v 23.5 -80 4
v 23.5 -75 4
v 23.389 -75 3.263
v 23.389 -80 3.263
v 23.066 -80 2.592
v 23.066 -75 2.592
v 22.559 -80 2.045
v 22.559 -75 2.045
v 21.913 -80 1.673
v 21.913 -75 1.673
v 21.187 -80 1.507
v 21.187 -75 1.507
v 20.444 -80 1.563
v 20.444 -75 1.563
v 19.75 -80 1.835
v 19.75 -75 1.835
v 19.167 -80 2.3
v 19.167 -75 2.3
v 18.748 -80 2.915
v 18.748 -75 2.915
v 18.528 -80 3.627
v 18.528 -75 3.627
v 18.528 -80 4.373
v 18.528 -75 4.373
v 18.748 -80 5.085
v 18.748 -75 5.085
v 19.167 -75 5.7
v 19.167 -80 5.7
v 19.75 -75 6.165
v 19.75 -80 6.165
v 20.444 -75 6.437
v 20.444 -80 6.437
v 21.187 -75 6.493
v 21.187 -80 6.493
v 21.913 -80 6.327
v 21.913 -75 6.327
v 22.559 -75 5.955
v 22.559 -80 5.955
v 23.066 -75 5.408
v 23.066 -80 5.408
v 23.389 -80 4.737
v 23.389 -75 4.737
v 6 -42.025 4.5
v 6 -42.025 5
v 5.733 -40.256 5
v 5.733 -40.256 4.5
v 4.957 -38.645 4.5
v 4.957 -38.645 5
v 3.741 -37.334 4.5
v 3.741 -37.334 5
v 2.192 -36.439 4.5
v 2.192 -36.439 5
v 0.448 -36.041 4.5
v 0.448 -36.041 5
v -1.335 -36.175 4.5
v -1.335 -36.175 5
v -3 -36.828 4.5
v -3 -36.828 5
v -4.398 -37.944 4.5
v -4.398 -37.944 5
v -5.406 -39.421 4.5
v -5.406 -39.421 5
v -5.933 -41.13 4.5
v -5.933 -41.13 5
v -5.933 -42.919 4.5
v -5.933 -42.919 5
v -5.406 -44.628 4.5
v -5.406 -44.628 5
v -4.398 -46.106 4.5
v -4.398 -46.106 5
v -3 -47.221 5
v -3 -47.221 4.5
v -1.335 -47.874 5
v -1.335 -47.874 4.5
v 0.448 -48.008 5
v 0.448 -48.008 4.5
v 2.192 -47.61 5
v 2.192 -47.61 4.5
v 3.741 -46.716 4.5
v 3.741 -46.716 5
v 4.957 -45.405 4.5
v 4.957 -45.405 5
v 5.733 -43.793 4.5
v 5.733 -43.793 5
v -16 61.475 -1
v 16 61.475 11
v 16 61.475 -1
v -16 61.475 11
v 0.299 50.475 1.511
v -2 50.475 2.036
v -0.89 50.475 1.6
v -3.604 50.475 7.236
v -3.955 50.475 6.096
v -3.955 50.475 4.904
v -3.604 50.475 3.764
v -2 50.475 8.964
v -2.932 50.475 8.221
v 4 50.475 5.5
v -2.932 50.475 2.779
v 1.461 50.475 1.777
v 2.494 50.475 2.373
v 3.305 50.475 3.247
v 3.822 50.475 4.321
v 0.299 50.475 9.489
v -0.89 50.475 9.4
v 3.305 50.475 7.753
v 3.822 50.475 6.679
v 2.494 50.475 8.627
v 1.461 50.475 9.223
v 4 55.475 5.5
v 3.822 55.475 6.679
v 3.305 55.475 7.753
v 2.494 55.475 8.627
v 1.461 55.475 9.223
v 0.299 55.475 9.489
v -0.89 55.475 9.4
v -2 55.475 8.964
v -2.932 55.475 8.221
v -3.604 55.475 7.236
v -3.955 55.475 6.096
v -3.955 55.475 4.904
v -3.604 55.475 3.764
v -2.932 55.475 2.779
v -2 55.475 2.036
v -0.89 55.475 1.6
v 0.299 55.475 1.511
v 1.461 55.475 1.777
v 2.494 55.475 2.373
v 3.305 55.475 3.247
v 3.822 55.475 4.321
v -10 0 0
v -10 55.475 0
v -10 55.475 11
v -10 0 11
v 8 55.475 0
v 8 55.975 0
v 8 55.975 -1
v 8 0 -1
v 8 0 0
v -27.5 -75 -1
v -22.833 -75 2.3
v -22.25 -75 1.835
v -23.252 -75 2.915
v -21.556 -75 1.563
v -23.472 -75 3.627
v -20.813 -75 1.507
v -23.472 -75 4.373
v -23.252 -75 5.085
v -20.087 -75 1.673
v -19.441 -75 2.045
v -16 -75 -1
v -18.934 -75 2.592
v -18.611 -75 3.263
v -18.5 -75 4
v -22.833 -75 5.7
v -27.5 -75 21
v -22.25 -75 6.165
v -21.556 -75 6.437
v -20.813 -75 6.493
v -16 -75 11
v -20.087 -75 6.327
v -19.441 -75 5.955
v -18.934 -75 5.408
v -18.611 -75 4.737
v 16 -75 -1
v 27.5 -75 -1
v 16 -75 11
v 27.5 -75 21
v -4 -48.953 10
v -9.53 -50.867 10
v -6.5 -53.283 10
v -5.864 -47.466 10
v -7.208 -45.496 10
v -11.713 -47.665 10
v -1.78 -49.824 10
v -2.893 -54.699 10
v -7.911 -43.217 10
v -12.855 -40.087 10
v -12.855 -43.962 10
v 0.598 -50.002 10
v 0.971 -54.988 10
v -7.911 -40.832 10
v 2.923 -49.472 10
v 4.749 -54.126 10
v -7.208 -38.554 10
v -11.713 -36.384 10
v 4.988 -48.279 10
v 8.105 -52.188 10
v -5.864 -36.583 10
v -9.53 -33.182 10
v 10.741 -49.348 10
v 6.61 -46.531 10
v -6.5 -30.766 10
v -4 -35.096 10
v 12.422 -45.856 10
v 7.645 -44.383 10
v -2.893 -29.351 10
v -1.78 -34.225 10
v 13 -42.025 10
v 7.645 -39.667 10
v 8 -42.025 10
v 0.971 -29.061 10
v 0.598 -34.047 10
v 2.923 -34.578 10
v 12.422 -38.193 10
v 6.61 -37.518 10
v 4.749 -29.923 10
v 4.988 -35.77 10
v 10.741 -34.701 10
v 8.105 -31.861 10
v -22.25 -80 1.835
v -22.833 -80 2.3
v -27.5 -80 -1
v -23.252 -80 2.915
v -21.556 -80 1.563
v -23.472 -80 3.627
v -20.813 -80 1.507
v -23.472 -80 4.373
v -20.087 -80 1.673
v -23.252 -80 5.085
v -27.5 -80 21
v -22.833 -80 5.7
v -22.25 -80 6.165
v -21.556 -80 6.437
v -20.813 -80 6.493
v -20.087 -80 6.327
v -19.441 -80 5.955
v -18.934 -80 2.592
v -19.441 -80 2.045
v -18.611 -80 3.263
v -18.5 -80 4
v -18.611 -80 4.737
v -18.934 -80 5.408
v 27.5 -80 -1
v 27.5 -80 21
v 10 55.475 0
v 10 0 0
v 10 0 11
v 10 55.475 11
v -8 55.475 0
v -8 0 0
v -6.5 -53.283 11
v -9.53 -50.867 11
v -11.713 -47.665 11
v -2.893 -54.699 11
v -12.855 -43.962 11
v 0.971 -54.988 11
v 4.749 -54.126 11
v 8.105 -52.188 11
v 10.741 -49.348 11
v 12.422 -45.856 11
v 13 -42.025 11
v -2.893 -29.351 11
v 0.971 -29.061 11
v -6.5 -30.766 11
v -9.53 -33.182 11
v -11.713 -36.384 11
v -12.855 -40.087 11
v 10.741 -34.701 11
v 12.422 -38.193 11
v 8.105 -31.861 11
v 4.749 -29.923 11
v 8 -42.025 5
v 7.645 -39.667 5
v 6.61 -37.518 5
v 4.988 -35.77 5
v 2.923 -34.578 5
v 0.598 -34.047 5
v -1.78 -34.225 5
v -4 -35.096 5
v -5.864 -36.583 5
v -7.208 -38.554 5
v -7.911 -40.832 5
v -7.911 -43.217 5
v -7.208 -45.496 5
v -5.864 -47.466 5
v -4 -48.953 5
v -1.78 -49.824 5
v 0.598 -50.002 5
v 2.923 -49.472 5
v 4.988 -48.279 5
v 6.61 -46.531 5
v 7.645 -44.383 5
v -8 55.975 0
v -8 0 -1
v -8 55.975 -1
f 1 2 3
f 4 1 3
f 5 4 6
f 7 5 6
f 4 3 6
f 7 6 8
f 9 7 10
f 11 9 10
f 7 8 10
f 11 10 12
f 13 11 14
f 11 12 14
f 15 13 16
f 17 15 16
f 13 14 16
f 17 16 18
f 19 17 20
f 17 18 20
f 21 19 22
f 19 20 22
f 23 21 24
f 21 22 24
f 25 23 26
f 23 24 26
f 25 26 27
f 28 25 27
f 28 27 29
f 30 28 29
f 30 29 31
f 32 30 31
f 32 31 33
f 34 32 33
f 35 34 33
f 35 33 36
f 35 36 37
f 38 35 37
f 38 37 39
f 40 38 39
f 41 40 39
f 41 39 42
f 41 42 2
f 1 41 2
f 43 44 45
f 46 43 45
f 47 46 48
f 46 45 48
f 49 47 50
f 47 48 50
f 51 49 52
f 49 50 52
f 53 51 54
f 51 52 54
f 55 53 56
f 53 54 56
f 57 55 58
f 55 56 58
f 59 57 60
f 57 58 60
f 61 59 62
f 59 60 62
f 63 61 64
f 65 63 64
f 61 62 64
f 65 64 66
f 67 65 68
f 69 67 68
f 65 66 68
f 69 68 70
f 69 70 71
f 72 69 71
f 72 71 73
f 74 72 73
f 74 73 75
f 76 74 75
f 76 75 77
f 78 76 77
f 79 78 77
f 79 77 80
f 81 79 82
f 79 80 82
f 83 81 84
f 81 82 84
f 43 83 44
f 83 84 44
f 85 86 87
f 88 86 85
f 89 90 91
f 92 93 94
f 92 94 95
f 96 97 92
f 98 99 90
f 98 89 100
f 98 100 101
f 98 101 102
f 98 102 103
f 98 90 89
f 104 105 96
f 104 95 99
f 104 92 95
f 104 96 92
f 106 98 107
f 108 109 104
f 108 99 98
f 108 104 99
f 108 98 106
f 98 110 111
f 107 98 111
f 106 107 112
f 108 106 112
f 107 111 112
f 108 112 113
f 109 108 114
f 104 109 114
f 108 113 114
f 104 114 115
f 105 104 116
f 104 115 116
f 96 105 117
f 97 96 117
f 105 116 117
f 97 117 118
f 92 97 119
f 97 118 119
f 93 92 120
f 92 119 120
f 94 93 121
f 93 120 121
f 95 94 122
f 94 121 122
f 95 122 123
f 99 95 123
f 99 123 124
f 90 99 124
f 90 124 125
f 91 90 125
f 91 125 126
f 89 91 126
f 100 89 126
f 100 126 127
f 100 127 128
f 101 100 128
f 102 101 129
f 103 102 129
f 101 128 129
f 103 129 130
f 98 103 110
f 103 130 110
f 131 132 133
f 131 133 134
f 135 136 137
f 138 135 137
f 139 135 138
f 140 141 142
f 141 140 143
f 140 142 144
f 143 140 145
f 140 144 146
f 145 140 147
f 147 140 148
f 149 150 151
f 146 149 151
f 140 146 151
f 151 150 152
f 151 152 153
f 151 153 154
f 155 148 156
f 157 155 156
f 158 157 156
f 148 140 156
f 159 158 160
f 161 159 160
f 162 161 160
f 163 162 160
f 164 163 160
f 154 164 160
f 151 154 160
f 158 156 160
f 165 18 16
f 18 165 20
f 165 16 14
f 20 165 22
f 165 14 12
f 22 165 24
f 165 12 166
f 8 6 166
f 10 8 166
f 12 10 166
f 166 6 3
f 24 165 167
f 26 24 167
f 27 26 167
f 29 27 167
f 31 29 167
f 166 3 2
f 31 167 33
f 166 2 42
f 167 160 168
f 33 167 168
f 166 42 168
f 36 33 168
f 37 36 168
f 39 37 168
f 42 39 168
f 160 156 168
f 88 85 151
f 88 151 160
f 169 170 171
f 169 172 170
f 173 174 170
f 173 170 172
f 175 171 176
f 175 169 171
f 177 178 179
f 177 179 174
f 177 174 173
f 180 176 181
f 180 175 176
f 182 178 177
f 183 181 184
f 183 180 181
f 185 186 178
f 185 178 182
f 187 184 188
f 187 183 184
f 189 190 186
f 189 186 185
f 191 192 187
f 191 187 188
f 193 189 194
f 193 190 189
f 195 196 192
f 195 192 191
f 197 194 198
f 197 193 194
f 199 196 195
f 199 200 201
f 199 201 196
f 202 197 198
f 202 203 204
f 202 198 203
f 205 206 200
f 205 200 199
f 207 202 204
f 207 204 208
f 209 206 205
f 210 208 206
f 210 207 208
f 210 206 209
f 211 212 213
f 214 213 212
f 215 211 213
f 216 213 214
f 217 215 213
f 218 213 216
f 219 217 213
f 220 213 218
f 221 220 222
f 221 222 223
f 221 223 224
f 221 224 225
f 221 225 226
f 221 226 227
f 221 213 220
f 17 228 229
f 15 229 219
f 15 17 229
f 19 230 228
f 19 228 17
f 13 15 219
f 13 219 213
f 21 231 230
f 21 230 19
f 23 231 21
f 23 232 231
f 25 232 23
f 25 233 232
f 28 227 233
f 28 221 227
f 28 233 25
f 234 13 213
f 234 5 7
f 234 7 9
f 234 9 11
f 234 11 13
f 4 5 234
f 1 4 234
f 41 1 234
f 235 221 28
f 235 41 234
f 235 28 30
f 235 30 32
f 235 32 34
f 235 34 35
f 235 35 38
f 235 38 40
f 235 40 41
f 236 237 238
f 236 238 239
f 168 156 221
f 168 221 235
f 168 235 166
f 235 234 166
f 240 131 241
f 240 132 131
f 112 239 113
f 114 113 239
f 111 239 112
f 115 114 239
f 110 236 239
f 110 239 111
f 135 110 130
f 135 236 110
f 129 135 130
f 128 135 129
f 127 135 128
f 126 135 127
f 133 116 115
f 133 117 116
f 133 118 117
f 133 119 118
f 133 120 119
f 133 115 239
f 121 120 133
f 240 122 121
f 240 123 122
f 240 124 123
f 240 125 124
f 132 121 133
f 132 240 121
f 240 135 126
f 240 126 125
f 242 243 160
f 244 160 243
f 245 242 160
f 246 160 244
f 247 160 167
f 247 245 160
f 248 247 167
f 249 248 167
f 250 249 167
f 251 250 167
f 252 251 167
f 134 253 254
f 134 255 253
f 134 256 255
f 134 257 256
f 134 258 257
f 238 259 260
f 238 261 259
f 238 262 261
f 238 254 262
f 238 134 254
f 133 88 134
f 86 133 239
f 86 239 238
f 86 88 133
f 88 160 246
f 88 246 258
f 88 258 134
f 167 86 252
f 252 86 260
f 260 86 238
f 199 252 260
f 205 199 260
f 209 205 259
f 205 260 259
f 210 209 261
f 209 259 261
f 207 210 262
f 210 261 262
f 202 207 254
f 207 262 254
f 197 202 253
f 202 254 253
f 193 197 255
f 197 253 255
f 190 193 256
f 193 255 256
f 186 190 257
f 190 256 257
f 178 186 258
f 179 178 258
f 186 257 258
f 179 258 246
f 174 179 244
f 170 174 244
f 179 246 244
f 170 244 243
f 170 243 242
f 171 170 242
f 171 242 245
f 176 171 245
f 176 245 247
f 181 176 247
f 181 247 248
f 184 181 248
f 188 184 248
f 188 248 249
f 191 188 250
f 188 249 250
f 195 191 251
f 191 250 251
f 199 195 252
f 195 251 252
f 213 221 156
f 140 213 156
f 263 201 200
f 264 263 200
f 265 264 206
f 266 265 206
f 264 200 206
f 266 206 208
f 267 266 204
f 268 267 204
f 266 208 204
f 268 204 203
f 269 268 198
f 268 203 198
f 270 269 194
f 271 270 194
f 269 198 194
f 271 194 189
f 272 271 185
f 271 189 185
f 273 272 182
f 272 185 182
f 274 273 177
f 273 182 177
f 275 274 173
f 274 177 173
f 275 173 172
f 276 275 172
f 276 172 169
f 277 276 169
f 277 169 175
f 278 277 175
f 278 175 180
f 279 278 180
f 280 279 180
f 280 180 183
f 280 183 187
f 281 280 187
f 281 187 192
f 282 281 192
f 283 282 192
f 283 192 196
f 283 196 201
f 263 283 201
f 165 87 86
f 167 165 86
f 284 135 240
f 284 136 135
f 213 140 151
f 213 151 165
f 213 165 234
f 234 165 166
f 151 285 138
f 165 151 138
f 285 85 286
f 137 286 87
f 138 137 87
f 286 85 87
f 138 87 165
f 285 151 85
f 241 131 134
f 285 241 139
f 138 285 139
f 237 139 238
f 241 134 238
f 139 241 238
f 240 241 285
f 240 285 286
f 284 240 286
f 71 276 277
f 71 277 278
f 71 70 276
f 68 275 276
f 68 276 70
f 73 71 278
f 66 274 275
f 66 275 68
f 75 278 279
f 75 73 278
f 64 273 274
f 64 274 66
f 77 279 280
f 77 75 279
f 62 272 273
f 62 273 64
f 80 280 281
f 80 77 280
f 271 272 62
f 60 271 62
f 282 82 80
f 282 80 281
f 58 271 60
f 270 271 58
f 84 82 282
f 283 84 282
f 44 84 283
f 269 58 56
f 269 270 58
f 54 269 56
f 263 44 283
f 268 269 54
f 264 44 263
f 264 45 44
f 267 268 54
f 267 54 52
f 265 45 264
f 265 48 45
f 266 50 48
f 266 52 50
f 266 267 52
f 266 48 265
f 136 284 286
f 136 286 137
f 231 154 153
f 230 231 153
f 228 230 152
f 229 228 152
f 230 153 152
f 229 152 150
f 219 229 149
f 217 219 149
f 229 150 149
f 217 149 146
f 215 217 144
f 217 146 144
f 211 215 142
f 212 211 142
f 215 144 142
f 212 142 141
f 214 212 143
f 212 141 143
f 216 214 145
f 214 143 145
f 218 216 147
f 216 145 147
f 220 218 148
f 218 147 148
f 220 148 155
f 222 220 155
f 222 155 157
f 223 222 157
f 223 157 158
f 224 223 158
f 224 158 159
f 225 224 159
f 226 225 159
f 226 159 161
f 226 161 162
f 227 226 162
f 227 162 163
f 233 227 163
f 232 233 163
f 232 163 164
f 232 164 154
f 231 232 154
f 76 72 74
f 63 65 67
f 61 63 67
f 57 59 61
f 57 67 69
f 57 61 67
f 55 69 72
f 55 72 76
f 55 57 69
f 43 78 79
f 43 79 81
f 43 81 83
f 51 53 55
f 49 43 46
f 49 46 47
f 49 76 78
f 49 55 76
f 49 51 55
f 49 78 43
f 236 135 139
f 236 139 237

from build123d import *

# Parameters (mm, degrees)
MAINFRAME_DEPTH             = 11
GUIDEBACKBOARD_DEPTH        = 1
SKETCH3_W                   = 32
SKETCH3_H                   = 12
LOWELENGTH_DEPTH            = 80
SKETCH4_R                   = 8
LOWERCUT_BEARING_HOLE_DEPTH = 6
SKETCH6_R                   = 6
LOWER_BEARING_HOLE1_DEPTH   = 0.5
SKETCH7_R                   = 13
LOWER_BEARING_HOLE_2_DEPTH  = 1
SKETCH11_W                  = 55
SKETCH11_H                  = 5
BOSS_EXTRUDE1_DEPTH         = 10
BOSS_EXTRUDE1_DEPTH_BACK    = 12
SKETCH12_R                  = 2.5
CUT_EXTRUDE5_DEPTH          = 6
SKETCH13_R                  = 4
BOSS_EXTRUDE2_DEPTH         = 5


with BuildPart() as part:
    # Sketch1 → MainFrame (new body)
    with BuildSketch(Plane.XY):
        Polygon((-16, 61.475378035), (16, 61.475378035), (16, 0), (10, 0), (10, 55.475378035), (-10, 55.475378035), (-10, 0), (-16, 0), align=None)
    extrude(amount=MAINFRAME_DEPTH)

    # Sketch2 → GuideBackBoard (add)
    with BuildSketch(Plane(origin=(0, 0, 0), x_dir=(-1, 0, 0), z_dir=(0, 0, -1))):
        Polygon((8, 0), (8, 55.975378035), (-8, 55.975378035), (-8, 0), (-16, 0), (-16, 61.475378035), (16, 61.475378035), (16, 0), align=None)
    extrude(amount=GUIDEBACKBOARD_DEPTH)

    # Sketch3 → LoweLength (add)
    with BuildSketch(Plane.XZ):
        with Locations((0, 5)):
            Rectangle(SKETCH3_W, SKETCH3_H)
    extrude(amount=LOWELENGTH_DEPTH)

    # Sketch4 → LowerCut Bearing Hole (cut)
    with BuildSketch(Plane.XY.offset(11)):
        with Locations((0, -42.024621965)):
            Circle(SKETCH4_R)
    extrude(amount=-LOWERCUT_BEARING_HOLE_DEPTH, mode=Mode.SUBTRACT)

    # Sketch6 → Lower Bearing Hole1 (cut)
    with BuildSketch(Plane.XY.offset(5)):
        with Locations((0, -42.024621965)):
            Circle(SKETCH6_R)
    extrude(amount=-LOWER_BEARING_HOLE1_DEPTH, mode=Mode.SUBTRACT)

    # Sketch7 → Lower Bearing Hole 2 (cut)
    with BuildSketch(Plane.XY.offset(11)):
        with Locations((0, -42.024621965)):
            Circle(SKETCH7_R)
    extrude(amount=-LOWER_BEARING_HOLE_2_DEPTH, mode=Mode.SUBTRACT)

    # Sketch11 → Boss-Extrude1 (add, two sides)
    with BuildSketch(Plane.XY.offset(11)) as boss_extrude1_sk:
        with Locations((0, -77.5)):
            Rectangle(SKETCH11_W, SKETCH11_H)
    extrude(amount=BOSS_EXTRUDE1_DEPTH)
    extrude(boss_extrude1_sk.sketch, amount=-BOSS_EXTRUDE1_DEPTH_BACK)

    # Sketch12 → Cut-Extrude5 (cut, through all)
    with BuildSketch(Plane(origin=(0, -75, 0), x_dir=(1, 0, 0), z_dir=(0, 1, 0))):
        with Locations((21, -4)):
            Circle(SKETCH12_R)
        with Locations((-21, -4)):
            Circle(SKETCH12_R)
    extrude(amount=-CUT_EXTRUDE5_DEPTH, mode=Mode.SUBTRACT)

    # Sketch13 → Boss-Extrude2 (add)
    with BuildSketch(Plane.XZ.offset(-55.475378035)):
        with Locations((0, 5.5)):
            Circle(SKETCH13_R)
    extrude(amount=BOSS_EXTRUDE2_DEPTH)


solid = part.part
